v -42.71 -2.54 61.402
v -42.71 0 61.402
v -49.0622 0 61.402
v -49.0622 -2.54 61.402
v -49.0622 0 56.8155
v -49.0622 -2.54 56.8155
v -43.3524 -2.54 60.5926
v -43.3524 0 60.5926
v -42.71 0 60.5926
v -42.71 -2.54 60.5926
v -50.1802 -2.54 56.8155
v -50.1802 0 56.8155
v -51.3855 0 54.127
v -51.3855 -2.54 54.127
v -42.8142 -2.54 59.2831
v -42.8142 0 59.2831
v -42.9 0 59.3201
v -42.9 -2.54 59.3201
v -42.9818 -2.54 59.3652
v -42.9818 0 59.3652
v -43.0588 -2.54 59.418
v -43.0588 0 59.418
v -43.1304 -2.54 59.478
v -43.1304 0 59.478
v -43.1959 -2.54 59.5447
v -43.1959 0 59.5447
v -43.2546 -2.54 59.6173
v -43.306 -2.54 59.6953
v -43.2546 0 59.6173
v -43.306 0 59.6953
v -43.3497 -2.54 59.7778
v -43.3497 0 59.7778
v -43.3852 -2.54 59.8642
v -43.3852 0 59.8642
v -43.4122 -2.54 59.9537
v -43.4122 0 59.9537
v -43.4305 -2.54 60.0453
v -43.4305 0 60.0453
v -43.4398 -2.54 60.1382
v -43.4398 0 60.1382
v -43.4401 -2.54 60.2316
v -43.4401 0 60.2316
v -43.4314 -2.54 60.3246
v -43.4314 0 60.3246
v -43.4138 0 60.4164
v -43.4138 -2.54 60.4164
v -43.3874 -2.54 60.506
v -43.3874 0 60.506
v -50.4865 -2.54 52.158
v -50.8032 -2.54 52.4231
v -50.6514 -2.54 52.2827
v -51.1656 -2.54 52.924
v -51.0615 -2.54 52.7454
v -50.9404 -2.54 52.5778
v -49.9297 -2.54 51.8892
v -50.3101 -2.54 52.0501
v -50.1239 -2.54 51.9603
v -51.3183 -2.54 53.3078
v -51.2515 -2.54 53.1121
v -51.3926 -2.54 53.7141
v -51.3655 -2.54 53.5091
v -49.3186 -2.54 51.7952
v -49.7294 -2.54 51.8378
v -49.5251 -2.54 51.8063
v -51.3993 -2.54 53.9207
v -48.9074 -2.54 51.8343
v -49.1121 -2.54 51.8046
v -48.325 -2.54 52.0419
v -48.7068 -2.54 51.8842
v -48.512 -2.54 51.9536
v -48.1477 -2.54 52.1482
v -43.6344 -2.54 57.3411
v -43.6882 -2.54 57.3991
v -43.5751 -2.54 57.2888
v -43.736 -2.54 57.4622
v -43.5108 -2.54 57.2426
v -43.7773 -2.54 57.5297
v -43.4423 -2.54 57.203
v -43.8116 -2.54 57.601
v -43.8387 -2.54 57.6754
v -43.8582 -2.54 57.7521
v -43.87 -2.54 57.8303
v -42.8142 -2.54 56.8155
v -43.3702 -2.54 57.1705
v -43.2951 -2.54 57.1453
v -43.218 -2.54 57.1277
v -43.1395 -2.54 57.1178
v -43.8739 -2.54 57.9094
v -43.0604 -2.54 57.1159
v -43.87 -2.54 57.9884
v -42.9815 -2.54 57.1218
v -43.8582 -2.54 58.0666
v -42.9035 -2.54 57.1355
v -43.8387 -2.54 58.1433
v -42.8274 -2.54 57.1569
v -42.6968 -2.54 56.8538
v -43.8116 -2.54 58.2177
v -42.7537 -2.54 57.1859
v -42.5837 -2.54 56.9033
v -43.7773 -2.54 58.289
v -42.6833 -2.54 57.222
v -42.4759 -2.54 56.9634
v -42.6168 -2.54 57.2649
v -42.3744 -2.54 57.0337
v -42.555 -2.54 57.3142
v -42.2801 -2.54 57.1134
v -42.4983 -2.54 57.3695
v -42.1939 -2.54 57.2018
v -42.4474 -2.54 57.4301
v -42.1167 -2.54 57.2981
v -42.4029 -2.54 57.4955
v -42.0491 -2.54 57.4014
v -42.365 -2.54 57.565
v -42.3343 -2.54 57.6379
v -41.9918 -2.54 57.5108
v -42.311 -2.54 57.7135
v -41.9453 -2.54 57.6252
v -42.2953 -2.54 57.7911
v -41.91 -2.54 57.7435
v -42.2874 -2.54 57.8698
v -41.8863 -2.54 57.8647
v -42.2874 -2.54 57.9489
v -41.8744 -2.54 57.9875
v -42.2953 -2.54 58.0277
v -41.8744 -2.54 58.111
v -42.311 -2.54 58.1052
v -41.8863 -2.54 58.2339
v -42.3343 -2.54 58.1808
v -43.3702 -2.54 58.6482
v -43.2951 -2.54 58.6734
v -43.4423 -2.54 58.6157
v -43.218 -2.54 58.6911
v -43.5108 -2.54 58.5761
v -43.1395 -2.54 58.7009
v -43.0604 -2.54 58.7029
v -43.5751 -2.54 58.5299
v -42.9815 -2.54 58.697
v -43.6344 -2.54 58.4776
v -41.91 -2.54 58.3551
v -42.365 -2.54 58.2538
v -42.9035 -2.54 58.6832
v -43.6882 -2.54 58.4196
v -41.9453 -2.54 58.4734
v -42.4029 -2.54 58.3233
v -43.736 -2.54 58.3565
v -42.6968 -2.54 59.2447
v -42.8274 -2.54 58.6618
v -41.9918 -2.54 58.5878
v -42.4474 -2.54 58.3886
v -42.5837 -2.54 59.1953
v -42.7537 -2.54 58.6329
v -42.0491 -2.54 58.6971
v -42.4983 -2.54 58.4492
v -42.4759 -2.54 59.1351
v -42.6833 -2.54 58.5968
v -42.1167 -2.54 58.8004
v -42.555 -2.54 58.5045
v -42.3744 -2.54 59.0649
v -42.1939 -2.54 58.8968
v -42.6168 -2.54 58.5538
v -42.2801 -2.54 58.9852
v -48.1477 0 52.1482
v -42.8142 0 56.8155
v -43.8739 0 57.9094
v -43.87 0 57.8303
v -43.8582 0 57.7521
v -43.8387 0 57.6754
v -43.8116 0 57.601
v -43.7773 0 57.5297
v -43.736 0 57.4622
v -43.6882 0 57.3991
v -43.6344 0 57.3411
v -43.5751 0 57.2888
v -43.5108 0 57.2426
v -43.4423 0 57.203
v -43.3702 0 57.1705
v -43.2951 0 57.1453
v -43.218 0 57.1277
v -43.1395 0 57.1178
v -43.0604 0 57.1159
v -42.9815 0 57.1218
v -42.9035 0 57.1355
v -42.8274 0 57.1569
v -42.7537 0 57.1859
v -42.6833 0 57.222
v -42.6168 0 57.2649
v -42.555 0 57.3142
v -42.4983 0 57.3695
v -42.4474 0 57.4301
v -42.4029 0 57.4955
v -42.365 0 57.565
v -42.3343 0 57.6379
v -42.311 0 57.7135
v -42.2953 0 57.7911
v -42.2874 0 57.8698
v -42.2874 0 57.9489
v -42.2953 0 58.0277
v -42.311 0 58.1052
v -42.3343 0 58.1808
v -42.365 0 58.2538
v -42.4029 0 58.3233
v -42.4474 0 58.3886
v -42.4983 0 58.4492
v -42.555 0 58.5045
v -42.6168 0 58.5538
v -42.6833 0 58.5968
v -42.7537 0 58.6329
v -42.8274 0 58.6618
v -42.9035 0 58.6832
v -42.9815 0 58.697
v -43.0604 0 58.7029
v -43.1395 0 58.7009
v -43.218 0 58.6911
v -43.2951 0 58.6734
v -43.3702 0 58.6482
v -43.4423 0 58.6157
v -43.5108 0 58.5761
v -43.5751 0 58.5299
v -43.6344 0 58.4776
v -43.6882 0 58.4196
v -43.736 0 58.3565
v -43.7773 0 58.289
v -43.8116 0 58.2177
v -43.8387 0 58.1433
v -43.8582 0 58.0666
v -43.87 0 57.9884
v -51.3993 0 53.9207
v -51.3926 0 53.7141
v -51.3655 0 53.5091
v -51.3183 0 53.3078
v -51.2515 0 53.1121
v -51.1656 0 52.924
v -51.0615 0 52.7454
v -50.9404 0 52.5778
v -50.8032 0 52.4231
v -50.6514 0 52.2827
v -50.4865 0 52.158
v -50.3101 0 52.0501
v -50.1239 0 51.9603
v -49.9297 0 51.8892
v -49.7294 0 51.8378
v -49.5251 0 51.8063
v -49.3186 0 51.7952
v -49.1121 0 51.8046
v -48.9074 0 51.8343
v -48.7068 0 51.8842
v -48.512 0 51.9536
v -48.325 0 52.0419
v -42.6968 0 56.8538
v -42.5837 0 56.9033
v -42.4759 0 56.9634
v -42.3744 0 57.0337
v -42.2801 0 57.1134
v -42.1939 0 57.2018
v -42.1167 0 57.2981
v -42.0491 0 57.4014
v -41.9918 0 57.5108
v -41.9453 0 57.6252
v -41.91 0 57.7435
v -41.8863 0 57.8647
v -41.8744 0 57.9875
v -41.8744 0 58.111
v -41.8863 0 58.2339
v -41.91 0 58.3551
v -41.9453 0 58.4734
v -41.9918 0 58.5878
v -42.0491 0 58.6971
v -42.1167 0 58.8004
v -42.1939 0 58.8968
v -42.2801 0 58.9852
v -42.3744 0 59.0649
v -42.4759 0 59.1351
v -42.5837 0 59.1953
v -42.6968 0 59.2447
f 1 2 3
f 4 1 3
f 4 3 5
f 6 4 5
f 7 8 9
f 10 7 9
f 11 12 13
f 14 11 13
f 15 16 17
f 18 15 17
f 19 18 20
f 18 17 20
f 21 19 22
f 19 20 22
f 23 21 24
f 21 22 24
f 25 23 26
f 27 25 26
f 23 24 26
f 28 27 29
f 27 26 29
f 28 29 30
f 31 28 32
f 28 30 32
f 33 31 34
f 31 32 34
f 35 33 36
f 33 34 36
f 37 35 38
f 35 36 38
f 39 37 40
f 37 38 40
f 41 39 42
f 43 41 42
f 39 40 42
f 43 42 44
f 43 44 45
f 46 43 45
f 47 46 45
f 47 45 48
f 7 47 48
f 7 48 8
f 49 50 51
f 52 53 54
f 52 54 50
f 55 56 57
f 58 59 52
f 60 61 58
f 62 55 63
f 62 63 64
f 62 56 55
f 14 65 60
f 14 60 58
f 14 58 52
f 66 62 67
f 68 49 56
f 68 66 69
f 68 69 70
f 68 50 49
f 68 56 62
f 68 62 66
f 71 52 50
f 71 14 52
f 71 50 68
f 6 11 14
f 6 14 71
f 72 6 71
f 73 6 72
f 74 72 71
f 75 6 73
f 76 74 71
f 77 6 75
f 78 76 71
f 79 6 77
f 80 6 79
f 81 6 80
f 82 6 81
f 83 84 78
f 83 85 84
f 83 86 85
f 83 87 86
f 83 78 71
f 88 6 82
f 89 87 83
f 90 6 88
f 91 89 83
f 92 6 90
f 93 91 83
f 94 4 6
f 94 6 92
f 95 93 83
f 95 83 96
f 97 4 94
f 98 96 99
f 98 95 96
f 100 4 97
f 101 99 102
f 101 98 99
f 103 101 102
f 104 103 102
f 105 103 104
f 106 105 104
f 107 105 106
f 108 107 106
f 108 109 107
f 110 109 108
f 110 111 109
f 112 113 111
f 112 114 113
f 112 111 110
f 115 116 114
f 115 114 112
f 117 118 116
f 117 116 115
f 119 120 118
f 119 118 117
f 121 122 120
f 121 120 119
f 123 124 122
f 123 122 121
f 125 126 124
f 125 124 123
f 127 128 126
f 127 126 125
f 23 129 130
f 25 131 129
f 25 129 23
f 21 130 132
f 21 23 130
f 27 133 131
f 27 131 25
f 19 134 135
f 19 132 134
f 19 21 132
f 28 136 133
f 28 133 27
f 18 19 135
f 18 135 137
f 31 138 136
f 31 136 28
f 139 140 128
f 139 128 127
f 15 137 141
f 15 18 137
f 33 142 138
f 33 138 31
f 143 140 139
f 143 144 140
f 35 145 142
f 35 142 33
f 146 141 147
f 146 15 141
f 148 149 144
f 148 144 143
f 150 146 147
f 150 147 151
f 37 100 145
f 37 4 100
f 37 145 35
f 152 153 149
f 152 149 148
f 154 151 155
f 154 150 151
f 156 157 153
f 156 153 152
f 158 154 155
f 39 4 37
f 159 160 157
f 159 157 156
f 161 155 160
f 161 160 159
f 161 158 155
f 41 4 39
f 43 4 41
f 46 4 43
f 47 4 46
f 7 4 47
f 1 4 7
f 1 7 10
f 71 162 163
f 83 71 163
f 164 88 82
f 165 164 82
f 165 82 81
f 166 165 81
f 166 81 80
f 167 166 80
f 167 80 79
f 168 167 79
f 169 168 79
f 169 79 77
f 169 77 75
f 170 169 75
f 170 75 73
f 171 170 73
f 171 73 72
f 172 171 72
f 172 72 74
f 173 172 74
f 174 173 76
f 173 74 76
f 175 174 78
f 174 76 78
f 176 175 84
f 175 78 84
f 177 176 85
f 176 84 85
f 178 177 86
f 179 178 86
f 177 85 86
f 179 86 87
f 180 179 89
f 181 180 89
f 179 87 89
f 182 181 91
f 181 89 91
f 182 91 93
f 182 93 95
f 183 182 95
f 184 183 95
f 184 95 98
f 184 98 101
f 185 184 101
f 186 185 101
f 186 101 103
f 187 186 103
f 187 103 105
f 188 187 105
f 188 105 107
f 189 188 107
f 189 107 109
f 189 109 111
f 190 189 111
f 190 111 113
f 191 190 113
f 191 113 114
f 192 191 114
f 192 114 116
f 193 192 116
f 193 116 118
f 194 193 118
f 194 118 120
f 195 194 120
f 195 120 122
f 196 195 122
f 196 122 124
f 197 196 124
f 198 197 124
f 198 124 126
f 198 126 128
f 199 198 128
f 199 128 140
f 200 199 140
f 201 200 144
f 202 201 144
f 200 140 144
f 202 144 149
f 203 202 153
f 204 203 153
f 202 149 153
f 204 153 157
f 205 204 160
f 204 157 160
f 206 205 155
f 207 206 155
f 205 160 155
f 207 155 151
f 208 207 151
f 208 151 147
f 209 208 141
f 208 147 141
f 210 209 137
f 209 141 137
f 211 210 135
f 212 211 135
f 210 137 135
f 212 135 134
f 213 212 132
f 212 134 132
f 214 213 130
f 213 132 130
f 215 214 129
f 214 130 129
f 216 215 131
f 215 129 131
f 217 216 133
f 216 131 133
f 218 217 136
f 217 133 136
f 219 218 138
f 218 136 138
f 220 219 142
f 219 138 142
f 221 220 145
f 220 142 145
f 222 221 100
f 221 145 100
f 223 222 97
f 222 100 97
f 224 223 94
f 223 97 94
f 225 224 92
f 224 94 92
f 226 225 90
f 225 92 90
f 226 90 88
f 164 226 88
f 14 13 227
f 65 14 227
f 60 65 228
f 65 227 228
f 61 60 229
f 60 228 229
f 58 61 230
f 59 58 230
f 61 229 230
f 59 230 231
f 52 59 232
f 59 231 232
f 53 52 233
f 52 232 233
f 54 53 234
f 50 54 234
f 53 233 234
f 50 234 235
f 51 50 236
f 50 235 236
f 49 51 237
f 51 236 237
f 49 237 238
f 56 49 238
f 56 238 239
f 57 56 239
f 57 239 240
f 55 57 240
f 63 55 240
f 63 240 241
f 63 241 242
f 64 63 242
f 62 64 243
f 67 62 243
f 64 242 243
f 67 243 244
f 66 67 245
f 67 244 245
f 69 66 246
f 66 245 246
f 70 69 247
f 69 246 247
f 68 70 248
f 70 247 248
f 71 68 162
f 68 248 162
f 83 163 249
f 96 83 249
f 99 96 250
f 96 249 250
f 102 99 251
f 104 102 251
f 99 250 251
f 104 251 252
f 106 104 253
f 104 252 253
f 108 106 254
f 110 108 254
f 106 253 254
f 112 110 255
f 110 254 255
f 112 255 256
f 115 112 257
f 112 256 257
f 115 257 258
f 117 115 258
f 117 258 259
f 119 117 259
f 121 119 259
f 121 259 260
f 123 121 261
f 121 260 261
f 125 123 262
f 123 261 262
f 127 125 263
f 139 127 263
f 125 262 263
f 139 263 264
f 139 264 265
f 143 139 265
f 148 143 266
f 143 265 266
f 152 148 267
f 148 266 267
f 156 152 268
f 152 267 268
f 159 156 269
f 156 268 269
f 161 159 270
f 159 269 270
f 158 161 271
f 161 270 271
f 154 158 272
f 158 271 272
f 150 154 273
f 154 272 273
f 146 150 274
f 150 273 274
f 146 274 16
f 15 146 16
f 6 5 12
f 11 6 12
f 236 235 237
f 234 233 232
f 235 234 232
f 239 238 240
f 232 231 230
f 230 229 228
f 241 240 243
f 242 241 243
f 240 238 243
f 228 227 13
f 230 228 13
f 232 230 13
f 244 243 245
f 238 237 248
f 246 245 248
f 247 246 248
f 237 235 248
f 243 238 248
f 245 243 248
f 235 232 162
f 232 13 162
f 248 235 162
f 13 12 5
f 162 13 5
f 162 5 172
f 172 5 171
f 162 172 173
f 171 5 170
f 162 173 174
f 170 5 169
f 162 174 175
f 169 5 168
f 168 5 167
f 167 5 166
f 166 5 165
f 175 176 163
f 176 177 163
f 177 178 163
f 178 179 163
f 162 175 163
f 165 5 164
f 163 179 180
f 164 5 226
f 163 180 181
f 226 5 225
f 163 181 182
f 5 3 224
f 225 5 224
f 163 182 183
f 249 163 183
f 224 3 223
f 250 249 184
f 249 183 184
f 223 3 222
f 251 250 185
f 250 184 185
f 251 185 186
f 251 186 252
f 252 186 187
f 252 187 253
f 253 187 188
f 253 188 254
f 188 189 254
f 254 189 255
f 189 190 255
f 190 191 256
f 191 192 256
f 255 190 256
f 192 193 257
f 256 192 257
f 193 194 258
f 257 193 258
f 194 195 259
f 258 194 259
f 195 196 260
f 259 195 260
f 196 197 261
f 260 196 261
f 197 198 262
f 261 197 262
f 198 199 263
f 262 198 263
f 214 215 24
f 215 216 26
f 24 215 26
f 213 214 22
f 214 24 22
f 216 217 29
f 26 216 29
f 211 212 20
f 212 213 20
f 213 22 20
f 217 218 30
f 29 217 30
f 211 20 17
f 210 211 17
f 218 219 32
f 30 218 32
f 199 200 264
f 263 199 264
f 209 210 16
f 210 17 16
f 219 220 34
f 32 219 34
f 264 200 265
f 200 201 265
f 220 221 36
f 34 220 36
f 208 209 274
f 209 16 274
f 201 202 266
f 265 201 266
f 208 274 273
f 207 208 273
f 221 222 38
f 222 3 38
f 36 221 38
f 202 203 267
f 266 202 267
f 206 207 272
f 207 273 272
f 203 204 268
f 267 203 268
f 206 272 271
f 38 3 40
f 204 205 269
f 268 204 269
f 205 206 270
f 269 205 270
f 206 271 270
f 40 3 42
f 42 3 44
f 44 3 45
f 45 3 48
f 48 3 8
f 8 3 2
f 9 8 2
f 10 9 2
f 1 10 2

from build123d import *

# Parameters (mm, degrees)
F1_DEPTH = 2.54
F2_D     = 1.5875


# Not quite as in the source:
# - a feature names something its author has since deleted; it is built from what else it names


with BuildPart() as f1:
    # F0 (on Front) → F1 (new body)
    with BuildSketch(Plane.XZ):
        with BuildLine():
            Line((-49.06217859, 61.4019967616), (-49.06217859, 56.8155013025))
            Line((-49.06217859, 56.8155013025), (-42.814206332, 56.8155013025))
            ThreePointArc((-42.814206332, 56.8155013025), (-41.8729112238, 58.0492764711), (-42.814206332, 59.2830516398))
            ThreePointArc((-42.814206332, 59.2830516398), (-43.3685164044, 59.8206001728), (-43.3524362743, 60.592584312))
            Line((-43.3524362743, 60.592584312), (-42.7099727094, 60.592584312))
            Line((-42.7099727094, 60.592584312), (-42.7099727094, 61.4019967616))
            Line((-42.7099727094, 61.4019967616), (-49.06217859, 61.4019967616))
        make_face()
        with BuildLine():
            Line((-49.06217859, 56.8155013025), (-50.180206332, 56.8155013025))
            Line((-50.180206332, 56.8155013025), (-51.3855293393, 54.1270449758))
            ThreePointArc((-51.3855293393, 54.1270449758), (-50.3996469968, 52.1018542735), (-48.1477119029, 52.148219198))
            Line((-48.1477119029, 52.148219198), (-42.814206332, 56.8155013025))
            Line((-42.814206332, 56.8155013025), (-49.06217859, 56.8155013025))
        make_face()
    extrude(amount=F1_DEPTH)

    # F2 (through all)
    with Locations(Plane(origin=(0, 0, 0), x_dir=(1, 0, 0), z_dir=(0, 1, 0))):
        with Locations((-43.0801697075, -57.9093620181)):
            Hole(F2_D / 2)


solid = f1.part
